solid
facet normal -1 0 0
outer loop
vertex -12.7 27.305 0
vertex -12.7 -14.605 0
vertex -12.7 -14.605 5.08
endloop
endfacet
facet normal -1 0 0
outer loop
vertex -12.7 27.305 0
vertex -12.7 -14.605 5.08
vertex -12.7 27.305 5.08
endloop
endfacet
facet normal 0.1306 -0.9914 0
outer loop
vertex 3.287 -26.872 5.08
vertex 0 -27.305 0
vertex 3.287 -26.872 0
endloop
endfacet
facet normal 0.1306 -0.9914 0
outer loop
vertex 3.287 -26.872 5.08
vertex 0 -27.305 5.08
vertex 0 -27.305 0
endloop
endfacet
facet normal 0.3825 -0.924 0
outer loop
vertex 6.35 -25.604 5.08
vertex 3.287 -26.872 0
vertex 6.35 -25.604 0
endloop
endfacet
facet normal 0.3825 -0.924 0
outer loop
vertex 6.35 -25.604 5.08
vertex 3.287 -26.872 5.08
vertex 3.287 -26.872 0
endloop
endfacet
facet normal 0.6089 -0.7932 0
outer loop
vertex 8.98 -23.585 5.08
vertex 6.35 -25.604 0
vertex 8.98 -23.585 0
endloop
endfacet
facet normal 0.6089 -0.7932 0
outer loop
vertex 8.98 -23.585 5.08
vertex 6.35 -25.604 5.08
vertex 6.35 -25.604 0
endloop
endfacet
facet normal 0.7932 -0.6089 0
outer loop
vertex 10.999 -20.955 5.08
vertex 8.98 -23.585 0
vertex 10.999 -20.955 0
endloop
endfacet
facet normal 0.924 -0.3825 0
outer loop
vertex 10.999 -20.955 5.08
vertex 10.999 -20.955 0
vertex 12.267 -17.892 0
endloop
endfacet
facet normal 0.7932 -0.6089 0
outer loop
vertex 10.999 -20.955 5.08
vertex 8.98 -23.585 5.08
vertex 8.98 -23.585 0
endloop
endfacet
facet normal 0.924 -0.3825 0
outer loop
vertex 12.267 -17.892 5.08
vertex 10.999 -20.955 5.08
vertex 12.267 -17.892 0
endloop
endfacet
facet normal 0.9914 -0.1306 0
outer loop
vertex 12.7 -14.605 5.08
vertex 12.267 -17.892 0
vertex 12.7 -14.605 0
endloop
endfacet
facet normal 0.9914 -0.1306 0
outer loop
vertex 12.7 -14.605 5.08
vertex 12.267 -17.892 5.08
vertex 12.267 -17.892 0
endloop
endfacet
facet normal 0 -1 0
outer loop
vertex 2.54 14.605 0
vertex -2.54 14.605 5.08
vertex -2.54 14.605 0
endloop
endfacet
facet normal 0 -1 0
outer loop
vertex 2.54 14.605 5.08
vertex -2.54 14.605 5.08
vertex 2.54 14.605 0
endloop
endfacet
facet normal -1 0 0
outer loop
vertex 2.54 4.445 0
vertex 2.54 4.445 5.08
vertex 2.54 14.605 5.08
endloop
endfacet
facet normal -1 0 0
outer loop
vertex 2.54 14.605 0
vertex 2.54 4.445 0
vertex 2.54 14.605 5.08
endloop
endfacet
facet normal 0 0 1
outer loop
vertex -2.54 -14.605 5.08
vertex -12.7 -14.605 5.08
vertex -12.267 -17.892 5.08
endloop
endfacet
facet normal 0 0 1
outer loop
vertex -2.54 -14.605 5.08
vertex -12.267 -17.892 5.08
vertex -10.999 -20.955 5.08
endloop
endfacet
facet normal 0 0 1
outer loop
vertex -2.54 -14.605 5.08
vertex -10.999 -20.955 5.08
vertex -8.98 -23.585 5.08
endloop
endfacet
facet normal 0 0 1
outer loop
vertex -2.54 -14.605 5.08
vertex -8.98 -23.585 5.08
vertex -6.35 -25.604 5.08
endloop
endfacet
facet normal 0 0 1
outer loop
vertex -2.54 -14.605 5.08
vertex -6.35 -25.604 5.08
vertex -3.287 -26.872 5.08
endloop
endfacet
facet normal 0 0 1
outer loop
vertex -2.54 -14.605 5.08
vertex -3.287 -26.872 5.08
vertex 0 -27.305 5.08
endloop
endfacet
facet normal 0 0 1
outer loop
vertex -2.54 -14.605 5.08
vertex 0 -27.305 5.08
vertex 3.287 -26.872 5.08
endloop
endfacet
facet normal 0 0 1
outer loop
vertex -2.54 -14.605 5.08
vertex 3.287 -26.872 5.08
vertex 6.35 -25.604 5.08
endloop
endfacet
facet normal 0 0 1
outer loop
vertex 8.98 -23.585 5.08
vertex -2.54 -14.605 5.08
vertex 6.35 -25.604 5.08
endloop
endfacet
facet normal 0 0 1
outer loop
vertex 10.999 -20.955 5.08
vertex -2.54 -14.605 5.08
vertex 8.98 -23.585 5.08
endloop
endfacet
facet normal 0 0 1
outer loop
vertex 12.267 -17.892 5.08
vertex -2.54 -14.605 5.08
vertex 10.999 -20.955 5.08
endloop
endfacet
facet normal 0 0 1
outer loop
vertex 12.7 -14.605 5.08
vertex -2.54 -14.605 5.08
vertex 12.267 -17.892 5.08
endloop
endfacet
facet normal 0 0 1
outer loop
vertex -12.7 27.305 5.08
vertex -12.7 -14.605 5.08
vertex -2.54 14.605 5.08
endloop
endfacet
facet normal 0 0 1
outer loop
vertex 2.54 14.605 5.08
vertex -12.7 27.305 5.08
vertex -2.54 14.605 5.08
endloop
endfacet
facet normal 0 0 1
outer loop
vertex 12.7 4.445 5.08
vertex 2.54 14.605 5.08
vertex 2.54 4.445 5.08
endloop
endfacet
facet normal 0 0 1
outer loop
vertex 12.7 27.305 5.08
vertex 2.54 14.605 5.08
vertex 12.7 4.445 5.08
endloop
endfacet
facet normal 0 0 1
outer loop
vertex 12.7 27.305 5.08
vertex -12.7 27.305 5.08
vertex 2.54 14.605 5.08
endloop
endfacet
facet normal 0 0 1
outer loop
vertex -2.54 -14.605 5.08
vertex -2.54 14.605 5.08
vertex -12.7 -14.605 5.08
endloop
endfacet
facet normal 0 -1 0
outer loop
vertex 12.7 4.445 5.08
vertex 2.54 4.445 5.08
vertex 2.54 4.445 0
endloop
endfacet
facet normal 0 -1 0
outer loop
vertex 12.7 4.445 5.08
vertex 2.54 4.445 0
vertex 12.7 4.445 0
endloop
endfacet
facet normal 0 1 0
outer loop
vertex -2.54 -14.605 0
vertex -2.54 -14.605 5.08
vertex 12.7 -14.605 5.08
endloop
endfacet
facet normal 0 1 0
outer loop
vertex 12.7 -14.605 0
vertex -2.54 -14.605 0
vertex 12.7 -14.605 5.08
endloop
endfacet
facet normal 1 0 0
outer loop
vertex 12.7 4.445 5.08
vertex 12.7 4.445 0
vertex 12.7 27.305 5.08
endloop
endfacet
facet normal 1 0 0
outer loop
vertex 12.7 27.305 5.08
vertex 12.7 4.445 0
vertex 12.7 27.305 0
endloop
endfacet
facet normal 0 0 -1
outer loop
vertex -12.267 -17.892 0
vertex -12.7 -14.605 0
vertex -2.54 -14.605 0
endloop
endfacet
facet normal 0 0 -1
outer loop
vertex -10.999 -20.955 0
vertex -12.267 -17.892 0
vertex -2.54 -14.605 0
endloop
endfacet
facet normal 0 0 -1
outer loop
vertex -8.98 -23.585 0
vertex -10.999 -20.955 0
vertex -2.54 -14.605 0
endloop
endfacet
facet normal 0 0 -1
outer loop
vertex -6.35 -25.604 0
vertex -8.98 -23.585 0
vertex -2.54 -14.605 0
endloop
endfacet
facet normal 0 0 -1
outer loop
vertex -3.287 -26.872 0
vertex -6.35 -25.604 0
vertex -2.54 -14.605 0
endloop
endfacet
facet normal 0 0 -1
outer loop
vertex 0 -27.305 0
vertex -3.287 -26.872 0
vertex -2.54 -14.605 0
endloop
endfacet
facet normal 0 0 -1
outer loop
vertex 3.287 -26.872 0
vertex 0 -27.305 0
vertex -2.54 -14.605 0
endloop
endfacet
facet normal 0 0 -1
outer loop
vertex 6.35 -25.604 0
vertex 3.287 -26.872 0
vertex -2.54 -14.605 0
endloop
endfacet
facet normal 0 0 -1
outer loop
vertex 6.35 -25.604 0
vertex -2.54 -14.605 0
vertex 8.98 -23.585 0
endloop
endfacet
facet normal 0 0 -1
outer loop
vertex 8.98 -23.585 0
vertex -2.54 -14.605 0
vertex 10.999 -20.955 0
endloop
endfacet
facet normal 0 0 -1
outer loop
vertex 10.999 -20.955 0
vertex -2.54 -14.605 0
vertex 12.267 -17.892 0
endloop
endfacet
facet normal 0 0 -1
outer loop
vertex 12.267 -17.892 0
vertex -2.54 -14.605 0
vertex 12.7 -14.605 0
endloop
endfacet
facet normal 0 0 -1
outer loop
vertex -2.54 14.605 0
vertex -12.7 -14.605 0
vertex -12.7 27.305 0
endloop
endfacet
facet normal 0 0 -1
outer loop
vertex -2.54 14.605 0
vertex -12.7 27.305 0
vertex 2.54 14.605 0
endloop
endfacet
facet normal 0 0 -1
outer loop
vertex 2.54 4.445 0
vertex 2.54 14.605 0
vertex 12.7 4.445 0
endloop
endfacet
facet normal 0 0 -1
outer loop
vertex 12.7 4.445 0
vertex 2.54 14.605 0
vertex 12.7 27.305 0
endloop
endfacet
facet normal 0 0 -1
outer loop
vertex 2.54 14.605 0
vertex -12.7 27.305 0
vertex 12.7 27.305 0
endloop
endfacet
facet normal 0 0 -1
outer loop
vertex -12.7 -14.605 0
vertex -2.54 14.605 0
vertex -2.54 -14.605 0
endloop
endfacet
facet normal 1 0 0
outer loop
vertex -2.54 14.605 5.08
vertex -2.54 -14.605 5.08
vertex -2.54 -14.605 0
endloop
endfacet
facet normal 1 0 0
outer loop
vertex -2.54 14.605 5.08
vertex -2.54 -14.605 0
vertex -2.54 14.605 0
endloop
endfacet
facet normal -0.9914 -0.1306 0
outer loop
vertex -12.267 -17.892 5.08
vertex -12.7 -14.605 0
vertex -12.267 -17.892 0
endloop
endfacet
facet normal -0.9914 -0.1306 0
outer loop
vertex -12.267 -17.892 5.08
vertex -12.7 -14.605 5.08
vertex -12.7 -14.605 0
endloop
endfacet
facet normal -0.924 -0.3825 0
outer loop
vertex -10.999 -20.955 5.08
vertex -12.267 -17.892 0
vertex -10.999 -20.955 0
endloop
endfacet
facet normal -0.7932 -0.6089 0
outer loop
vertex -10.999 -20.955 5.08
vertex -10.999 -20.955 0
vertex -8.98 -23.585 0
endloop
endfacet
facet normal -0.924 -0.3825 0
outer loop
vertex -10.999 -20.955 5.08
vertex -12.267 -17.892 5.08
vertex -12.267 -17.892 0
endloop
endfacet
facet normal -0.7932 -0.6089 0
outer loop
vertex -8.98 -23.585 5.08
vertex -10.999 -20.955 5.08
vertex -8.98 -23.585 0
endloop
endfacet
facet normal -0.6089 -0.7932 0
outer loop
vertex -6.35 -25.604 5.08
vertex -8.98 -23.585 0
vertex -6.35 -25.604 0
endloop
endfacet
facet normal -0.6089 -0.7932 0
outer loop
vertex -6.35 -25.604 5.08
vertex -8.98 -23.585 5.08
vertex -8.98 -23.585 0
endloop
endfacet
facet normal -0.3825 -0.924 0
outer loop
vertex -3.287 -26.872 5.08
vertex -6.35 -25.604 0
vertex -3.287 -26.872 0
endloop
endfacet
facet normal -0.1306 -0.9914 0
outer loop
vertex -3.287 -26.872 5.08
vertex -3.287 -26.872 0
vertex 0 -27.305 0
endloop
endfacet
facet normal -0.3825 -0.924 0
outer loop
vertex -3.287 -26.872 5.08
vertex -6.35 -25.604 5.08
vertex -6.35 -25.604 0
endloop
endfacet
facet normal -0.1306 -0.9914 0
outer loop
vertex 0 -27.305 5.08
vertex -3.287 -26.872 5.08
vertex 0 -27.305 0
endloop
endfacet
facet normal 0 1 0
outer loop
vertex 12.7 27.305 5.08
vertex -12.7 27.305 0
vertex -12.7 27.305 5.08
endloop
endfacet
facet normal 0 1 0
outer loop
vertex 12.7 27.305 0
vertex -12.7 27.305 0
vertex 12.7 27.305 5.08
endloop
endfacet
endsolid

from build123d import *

# Parameters (mm, degrees)
SKETCH1_W           = 25.4
SKETCH1_H           = 54.61
BOSS_EXTRUDE1_DEPTH = 5.08
FILLET1_R           = 12.7
SKETCH2_W           = 15.24
SKETCH2_H           = 19.05
CUT_EXTRUDE1_DEPTH  = 12.7
SKETCH3_W           = 5.08
SKETCH3_H           = 10.16
CUT_EXTRUDE2_DEPTH  = 12.7


with BuildPart() as part:
    # Sketch1 → Boss-Extrude1 (new body)
    with BuildSketch(Plane.XY):
        Rectangle(SKETCH1_W, SKETCH1_H)
    extrude(amount=BOSS_EXTRUDE1_DEPTH)

    # Fillet1
    fillet1_edges = [part.edges().sort_by_distance(p)[0] for p in [
        (12.7, -27.305, 2.54),
        (-12.7, -27.305, 2.54),
    ]]
    fillet(fillet1_edges, radius=FILLET1_R - 0.0001)  # a hair under: the kernel refuses the full size

    # Sketch2 → Cut-Extrude1 (cut)
    with BuildSketch(Plane.XY.offset(5.08)):
        with Locations((5.08, -5.08)):
            Rectangle(SKETCH2_W, SKETCH2_H)
    extrude(amount=-CUT_EXTRUDE1_DEPTH, mode=Mode.SUBTRACT)

    # Sketch3 → Cut-Extrude2 (cut)
    with BuildSketch(Plane.XY.offset(5.08)):
        with Locations((0, 9.525)):
            Rectangle(SKETCH3_W, SKETCH3_H)
    extrude(amount=-CUT_EXTRUDE2_DEPTH, mode=Mode.SUBTRACT)


solid = part.part
